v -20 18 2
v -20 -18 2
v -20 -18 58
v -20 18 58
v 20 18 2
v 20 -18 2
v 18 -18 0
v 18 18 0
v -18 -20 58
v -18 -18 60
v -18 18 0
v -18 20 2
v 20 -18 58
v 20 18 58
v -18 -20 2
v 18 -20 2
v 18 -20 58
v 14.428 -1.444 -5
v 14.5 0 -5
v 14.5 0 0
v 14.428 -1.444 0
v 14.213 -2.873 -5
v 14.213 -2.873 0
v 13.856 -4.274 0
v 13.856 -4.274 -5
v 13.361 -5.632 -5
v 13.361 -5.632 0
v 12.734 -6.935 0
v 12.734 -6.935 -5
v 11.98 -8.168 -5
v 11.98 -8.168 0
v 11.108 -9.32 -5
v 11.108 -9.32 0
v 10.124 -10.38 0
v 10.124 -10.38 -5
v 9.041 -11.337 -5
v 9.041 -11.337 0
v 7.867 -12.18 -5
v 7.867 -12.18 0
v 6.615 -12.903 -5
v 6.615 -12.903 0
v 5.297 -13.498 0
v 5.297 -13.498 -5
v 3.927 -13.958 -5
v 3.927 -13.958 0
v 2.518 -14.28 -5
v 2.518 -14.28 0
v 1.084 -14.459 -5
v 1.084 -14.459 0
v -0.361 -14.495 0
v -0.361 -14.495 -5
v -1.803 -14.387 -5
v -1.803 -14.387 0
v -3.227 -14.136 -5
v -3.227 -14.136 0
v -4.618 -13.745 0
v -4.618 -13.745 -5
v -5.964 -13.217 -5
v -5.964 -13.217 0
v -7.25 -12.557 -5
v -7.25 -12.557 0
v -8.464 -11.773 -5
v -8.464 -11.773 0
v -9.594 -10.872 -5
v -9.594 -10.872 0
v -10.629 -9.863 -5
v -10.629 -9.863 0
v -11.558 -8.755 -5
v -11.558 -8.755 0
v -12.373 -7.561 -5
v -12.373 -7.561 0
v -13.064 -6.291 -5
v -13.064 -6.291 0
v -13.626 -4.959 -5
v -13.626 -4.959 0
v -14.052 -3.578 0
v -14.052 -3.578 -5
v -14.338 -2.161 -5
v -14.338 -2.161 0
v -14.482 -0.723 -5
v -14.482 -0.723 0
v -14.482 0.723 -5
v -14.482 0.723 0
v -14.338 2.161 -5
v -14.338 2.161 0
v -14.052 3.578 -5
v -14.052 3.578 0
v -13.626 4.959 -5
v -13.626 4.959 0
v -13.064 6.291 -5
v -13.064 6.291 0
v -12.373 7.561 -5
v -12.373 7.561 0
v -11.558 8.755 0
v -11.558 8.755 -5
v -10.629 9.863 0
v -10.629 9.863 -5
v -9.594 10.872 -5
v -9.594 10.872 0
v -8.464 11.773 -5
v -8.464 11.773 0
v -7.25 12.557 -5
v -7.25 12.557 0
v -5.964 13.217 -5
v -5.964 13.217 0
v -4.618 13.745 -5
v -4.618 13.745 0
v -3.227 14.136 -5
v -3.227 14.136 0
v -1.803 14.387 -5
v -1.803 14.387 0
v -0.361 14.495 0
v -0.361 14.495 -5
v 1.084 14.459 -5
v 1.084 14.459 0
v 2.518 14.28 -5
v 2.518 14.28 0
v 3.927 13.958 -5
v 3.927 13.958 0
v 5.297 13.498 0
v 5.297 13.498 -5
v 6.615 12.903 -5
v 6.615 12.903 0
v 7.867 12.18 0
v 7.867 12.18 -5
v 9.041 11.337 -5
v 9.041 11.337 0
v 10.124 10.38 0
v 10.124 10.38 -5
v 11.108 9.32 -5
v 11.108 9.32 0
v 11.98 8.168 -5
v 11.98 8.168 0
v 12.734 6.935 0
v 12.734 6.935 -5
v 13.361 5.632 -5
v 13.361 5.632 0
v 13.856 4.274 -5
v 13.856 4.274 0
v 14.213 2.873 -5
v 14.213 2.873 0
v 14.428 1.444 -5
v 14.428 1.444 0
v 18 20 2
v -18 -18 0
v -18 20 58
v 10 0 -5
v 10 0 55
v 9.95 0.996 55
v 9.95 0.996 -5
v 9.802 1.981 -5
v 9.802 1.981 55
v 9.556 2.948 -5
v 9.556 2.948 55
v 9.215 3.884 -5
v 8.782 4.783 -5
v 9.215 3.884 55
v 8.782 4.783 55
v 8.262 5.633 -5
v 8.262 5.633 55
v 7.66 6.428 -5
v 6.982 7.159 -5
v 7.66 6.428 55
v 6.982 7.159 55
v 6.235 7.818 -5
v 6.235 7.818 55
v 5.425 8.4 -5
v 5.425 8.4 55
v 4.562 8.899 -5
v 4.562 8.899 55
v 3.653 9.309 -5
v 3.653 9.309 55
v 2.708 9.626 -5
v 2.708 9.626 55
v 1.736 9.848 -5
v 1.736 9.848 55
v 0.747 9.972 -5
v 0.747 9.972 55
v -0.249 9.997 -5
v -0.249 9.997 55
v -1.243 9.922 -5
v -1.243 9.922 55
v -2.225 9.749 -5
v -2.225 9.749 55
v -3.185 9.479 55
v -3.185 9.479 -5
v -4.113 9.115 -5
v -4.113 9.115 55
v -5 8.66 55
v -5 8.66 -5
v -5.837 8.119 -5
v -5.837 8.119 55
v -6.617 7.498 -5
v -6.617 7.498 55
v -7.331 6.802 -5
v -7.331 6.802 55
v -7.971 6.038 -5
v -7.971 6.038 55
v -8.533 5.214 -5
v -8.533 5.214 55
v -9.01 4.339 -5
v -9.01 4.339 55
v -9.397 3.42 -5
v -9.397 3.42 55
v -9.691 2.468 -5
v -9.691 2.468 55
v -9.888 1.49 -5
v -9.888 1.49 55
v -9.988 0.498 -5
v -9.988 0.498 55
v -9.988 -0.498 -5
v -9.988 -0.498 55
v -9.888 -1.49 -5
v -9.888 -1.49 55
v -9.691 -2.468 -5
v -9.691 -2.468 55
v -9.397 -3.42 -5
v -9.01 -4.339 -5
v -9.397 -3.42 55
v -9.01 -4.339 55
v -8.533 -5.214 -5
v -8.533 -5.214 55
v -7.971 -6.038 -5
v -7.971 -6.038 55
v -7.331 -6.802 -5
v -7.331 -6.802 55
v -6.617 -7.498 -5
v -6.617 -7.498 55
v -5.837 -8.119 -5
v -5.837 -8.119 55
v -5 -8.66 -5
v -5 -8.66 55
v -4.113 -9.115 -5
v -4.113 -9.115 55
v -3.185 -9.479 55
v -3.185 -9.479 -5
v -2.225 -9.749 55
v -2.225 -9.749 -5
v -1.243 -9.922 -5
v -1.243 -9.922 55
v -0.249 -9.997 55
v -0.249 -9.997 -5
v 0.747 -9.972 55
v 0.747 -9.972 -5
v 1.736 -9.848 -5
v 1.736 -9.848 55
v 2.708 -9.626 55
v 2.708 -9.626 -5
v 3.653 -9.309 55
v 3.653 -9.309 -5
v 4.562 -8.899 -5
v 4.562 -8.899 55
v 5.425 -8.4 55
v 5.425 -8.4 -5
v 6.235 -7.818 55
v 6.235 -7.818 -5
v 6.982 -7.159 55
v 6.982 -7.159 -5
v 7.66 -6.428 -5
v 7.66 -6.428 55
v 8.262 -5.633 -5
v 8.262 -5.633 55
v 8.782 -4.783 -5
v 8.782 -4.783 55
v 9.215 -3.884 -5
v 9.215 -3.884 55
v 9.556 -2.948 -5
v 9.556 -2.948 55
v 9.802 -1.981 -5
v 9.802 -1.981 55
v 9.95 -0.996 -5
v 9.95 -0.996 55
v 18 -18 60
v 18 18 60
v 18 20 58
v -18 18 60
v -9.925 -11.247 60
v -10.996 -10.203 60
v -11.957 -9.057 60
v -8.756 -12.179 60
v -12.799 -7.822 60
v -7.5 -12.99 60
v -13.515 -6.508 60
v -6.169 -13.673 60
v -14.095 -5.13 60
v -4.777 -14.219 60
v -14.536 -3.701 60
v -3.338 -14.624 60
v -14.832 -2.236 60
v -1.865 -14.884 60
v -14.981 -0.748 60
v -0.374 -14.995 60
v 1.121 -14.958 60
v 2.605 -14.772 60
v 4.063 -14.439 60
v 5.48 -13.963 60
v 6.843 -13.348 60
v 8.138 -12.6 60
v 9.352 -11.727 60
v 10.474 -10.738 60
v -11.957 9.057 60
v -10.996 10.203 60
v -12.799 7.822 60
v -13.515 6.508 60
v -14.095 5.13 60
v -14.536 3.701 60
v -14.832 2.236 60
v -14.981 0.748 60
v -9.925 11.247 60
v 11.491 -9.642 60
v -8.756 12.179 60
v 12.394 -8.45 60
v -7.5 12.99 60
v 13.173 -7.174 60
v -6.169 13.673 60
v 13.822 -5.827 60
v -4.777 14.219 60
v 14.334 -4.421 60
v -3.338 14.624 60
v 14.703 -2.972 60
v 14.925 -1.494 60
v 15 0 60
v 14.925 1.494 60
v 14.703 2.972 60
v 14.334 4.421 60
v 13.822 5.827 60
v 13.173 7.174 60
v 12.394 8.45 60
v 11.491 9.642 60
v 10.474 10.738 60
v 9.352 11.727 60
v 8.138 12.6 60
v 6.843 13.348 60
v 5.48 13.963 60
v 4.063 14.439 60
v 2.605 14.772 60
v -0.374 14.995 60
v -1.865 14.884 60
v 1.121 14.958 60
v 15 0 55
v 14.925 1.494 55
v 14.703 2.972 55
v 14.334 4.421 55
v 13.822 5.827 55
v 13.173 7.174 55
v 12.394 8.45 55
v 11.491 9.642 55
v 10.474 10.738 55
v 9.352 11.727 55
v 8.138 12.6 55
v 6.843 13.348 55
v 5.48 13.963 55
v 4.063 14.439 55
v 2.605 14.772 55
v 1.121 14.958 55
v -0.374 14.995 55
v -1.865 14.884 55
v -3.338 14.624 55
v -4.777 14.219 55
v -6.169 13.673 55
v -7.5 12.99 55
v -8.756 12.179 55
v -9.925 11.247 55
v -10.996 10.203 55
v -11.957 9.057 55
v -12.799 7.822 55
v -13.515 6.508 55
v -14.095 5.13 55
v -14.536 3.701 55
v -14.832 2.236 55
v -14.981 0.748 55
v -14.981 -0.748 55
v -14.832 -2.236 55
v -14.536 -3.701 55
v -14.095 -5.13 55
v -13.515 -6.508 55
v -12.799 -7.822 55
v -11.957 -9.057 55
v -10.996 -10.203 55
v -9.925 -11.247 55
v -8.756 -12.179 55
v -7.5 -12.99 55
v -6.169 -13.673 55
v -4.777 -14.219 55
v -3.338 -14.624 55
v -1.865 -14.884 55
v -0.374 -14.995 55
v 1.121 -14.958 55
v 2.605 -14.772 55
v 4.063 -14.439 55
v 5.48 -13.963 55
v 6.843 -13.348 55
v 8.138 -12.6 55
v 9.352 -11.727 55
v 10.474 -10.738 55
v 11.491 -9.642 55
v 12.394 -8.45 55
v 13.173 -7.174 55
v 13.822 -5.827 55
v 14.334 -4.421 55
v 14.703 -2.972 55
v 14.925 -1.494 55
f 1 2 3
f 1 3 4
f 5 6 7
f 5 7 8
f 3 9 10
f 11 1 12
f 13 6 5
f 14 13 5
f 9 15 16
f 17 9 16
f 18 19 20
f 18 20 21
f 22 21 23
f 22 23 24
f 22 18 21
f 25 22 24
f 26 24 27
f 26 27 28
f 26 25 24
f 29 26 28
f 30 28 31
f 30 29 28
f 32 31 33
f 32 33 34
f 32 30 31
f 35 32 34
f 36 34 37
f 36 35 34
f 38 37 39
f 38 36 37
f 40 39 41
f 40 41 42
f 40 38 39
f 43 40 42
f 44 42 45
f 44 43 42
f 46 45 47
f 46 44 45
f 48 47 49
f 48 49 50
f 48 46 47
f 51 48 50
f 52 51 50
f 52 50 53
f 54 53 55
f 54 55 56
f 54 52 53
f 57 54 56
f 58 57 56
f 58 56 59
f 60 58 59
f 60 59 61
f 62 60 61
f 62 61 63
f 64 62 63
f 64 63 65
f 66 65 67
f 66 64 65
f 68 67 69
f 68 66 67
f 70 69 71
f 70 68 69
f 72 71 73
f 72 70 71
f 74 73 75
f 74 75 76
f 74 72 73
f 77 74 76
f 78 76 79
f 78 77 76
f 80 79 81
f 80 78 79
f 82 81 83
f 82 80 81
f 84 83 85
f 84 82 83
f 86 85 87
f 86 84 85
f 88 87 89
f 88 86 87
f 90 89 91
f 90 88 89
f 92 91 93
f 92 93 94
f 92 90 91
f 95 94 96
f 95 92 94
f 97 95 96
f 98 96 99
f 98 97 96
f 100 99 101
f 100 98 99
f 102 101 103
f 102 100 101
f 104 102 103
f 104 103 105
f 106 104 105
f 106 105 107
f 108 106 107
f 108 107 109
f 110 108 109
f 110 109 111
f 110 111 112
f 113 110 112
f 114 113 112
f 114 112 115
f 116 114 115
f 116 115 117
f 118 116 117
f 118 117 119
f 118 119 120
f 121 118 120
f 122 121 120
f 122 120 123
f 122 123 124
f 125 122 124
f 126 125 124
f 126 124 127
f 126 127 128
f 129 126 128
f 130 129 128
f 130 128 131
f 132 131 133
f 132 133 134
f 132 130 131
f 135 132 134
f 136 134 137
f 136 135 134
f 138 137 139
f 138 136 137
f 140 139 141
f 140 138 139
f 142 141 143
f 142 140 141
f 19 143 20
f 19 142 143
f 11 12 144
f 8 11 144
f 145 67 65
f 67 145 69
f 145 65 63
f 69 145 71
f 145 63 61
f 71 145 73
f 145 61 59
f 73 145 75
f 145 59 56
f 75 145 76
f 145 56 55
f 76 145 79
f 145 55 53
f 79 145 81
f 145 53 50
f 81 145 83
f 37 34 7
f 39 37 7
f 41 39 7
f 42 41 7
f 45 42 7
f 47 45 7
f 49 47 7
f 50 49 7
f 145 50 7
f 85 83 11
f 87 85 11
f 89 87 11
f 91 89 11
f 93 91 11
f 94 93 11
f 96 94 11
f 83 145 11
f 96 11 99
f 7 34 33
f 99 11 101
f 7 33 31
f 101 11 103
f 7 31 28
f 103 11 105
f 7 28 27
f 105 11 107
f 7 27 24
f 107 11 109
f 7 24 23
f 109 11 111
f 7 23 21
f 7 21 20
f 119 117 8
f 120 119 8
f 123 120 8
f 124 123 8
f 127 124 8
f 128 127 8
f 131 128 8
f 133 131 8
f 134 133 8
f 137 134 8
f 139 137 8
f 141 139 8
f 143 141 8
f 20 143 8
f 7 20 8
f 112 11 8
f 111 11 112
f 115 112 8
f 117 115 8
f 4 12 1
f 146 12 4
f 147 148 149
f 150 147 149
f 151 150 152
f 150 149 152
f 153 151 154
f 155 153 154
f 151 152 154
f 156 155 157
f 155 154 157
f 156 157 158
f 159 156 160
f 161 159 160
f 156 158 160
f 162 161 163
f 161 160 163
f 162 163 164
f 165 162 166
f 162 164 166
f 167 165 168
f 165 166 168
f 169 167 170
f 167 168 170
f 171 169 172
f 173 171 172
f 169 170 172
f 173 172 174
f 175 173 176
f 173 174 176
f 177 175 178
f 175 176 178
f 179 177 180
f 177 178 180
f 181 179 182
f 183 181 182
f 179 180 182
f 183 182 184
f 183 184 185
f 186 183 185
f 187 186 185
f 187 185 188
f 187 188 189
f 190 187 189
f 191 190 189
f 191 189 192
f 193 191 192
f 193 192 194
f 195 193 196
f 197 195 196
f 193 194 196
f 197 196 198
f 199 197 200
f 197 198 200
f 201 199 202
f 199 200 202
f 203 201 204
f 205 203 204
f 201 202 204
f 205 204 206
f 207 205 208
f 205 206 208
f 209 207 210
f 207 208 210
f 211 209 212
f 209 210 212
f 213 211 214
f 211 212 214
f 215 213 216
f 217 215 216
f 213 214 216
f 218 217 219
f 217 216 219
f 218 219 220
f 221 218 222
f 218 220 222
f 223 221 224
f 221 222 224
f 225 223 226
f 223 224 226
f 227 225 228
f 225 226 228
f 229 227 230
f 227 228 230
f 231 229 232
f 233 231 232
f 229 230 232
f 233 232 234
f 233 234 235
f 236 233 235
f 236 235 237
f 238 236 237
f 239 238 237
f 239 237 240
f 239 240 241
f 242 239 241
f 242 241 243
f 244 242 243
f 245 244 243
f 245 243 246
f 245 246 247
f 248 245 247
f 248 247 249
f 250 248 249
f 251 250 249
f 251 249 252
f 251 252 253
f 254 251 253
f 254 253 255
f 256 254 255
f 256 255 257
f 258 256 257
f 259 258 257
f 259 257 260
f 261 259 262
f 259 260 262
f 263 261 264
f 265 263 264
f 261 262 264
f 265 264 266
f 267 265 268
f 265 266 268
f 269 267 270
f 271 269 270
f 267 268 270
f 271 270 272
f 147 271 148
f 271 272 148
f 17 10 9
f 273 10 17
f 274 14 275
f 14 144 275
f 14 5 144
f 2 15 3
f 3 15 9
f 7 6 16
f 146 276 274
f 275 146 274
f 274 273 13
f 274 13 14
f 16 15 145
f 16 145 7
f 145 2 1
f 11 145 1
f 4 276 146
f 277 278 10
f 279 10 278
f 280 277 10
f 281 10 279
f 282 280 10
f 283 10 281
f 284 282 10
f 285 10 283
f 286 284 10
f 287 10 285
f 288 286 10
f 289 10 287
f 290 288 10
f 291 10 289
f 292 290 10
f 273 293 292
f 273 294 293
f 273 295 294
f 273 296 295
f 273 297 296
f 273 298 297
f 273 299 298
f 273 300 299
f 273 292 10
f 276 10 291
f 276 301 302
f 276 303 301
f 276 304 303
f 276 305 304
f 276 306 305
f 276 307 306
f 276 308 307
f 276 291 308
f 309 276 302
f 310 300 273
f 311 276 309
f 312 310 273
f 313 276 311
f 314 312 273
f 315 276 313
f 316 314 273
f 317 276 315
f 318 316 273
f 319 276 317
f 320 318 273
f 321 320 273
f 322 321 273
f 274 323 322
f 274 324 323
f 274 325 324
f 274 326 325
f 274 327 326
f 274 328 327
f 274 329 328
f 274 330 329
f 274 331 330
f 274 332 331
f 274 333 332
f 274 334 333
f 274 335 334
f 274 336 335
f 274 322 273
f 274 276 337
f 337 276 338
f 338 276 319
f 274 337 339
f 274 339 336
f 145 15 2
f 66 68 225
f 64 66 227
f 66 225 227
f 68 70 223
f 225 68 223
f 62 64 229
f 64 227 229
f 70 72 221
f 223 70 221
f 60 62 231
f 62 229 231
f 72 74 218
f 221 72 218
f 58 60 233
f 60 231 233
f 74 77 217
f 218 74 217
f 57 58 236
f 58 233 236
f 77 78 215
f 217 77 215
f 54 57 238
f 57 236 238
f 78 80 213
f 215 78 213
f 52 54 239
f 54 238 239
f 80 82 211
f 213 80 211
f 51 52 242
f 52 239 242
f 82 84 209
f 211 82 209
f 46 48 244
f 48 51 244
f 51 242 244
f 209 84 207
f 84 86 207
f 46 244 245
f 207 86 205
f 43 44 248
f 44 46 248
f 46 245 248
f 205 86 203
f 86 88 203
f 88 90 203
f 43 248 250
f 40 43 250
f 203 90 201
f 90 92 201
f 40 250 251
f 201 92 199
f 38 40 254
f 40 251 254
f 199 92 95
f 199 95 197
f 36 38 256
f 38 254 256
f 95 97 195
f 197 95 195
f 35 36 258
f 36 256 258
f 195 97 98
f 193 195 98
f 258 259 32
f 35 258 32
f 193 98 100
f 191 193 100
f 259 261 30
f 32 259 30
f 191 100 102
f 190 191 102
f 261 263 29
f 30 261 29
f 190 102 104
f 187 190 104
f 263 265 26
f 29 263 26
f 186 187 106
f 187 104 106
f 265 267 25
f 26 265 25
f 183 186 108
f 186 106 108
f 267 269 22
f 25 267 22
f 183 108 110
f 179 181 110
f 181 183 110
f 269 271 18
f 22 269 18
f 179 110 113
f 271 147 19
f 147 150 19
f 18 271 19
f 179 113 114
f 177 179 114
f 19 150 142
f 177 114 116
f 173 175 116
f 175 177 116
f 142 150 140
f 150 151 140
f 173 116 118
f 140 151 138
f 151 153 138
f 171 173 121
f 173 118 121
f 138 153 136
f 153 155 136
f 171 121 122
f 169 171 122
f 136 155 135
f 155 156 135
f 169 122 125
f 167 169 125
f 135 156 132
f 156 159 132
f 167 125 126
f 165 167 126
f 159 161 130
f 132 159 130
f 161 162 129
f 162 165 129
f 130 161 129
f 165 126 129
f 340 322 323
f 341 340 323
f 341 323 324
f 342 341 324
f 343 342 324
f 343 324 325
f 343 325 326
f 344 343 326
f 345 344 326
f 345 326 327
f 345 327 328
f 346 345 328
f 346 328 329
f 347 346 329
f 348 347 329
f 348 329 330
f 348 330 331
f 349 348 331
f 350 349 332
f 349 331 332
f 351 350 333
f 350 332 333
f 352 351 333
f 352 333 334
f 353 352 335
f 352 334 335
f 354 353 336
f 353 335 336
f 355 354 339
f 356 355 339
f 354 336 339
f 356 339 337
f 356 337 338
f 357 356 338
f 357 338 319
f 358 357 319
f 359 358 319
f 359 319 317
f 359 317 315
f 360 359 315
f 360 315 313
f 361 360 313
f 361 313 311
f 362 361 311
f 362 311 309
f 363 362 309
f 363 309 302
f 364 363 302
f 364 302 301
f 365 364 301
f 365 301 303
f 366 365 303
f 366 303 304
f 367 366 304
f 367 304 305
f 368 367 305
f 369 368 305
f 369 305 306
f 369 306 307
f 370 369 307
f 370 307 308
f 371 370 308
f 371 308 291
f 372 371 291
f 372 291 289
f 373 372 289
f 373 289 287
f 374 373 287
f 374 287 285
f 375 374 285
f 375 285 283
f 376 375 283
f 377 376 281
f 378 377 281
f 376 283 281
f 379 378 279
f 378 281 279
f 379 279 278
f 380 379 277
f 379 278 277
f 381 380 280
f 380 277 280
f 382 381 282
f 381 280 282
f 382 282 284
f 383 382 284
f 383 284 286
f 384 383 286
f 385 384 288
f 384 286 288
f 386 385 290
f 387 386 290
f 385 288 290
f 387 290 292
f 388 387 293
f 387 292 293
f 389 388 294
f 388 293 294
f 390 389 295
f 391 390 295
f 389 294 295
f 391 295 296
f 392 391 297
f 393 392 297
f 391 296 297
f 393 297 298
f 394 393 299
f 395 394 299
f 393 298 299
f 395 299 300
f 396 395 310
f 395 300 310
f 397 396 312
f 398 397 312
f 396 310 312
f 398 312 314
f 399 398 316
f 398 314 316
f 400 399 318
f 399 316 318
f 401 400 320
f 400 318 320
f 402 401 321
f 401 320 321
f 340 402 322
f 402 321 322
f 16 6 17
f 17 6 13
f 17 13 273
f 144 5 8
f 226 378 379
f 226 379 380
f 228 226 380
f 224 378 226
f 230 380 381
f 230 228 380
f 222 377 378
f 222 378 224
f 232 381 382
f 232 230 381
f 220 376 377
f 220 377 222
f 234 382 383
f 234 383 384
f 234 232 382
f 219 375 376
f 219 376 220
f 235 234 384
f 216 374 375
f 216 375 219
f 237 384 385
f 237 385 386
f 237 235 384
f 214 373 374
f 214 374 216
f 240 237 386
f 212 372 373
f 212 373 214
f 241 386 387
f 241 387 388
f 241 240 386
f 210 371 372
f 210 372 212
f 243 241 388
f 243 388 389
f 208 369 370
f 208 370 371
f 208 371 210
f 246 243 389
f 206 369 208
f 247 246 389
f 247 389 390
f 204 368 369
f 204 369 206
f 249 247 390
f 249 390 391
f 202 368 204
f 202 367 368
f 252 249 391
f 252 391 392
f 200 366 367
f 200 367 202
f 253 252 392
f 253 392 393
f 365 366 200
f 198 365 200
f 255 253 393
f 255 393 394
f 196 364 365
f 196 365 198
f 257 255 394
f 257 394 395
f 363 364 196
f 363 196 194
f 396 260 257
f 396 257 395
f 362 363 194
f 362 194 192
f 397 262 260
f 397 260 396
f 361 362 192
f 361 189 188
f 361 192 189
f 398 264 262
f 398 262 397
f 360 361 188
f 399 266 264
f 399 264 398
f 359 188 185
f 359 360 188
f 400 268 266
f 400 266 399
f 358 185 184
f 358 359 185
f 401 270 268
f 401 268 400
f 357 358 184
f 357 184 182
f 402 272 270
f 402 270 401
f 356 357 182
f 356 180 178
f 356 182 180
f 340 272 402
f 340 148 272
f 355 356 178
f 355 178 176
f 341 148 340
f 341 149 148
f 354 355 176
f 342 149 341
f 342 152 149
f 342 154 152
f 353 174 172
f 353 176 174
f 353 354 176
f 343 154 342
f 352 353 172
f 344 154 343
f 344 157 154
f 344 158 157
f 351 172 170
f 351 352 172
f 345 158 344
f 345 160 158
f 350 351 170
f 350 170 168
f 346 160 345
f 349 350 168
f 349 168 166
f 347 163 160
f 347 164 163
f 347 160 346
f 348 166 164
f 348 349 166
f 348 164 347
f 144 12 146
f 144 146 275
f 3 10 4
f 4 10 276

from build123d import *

# Parameters (mm, degrees)
F0_W     = 40
F0_H     = 40
F1_DEPTH = 60
F2_R     = 15
F3_DEPTH = 60
F5_START = -5
F4_R     = 15
F4_R_2   = 10
F5_DEPTH = 60
F6_SIZE  = 2
F7_W     = 88.496286422
F7_H     = 74.0717835724
F7_R     = 14.5
F8_DEPTH = 5


with BuildPart() as f1:
    # F0 (on Top) → F1 (new body)
    with BuildSketch(Plane.XY):
        Rectangle(F0_W, F0_H)
    extrude(amount=F1_DEPTH)

    # F2 (on face) → F3 (cut)
    with BuildSketch(Plane.XY.offset(60)):
        Circle(F2_R)
    extrude(amount=-F3_DEPTH, mode=Mode.SUBTRACT)

    # F4 (on face) → F5 (join)
    with BuildSketch(Plane.XY.offset(60).offset(F5_START)):
        Circle(F4_R)
        Circle(F4_R_2, mode=Mode.SUBTRACT)
    extrude(amount=-F5_DEPTH)

    # F6
    f6_edges = [f1.edges().sort_by_distance(p)[0] for p in [
        (20, -20, 30),
        (20, 20, 30),
        (-20, -20, 30),
        (20, 0, 60),
        (0, -20, 60),
        (-20, 0, 60),
        (0, 20, 60),
        (-20, 20, 30),
        (20, 0, 0),
        (0, -20, 0),
        (-20, 0, 0),
        (0, 20, 0),
    ]]
    chamfer(f6_edges, length=F6_SIZE)

    # F7 (on face) → F8 (cut)
    with BuildSketch(Plane(origin=(0, 0, -5), x_dir=(1, 0, 0), z_dir=(0, 0, -1))):
        with Locations((-0.5847793072, -3.7035886198)):
            Rectangle(F7_W, F7_H)
        Circle(F7_R, mode=Mode.SUBTRACT)
    extrude(amount=-F8_DEPTH, mode=Mode.SUBTRACT)


solid = f1.part
